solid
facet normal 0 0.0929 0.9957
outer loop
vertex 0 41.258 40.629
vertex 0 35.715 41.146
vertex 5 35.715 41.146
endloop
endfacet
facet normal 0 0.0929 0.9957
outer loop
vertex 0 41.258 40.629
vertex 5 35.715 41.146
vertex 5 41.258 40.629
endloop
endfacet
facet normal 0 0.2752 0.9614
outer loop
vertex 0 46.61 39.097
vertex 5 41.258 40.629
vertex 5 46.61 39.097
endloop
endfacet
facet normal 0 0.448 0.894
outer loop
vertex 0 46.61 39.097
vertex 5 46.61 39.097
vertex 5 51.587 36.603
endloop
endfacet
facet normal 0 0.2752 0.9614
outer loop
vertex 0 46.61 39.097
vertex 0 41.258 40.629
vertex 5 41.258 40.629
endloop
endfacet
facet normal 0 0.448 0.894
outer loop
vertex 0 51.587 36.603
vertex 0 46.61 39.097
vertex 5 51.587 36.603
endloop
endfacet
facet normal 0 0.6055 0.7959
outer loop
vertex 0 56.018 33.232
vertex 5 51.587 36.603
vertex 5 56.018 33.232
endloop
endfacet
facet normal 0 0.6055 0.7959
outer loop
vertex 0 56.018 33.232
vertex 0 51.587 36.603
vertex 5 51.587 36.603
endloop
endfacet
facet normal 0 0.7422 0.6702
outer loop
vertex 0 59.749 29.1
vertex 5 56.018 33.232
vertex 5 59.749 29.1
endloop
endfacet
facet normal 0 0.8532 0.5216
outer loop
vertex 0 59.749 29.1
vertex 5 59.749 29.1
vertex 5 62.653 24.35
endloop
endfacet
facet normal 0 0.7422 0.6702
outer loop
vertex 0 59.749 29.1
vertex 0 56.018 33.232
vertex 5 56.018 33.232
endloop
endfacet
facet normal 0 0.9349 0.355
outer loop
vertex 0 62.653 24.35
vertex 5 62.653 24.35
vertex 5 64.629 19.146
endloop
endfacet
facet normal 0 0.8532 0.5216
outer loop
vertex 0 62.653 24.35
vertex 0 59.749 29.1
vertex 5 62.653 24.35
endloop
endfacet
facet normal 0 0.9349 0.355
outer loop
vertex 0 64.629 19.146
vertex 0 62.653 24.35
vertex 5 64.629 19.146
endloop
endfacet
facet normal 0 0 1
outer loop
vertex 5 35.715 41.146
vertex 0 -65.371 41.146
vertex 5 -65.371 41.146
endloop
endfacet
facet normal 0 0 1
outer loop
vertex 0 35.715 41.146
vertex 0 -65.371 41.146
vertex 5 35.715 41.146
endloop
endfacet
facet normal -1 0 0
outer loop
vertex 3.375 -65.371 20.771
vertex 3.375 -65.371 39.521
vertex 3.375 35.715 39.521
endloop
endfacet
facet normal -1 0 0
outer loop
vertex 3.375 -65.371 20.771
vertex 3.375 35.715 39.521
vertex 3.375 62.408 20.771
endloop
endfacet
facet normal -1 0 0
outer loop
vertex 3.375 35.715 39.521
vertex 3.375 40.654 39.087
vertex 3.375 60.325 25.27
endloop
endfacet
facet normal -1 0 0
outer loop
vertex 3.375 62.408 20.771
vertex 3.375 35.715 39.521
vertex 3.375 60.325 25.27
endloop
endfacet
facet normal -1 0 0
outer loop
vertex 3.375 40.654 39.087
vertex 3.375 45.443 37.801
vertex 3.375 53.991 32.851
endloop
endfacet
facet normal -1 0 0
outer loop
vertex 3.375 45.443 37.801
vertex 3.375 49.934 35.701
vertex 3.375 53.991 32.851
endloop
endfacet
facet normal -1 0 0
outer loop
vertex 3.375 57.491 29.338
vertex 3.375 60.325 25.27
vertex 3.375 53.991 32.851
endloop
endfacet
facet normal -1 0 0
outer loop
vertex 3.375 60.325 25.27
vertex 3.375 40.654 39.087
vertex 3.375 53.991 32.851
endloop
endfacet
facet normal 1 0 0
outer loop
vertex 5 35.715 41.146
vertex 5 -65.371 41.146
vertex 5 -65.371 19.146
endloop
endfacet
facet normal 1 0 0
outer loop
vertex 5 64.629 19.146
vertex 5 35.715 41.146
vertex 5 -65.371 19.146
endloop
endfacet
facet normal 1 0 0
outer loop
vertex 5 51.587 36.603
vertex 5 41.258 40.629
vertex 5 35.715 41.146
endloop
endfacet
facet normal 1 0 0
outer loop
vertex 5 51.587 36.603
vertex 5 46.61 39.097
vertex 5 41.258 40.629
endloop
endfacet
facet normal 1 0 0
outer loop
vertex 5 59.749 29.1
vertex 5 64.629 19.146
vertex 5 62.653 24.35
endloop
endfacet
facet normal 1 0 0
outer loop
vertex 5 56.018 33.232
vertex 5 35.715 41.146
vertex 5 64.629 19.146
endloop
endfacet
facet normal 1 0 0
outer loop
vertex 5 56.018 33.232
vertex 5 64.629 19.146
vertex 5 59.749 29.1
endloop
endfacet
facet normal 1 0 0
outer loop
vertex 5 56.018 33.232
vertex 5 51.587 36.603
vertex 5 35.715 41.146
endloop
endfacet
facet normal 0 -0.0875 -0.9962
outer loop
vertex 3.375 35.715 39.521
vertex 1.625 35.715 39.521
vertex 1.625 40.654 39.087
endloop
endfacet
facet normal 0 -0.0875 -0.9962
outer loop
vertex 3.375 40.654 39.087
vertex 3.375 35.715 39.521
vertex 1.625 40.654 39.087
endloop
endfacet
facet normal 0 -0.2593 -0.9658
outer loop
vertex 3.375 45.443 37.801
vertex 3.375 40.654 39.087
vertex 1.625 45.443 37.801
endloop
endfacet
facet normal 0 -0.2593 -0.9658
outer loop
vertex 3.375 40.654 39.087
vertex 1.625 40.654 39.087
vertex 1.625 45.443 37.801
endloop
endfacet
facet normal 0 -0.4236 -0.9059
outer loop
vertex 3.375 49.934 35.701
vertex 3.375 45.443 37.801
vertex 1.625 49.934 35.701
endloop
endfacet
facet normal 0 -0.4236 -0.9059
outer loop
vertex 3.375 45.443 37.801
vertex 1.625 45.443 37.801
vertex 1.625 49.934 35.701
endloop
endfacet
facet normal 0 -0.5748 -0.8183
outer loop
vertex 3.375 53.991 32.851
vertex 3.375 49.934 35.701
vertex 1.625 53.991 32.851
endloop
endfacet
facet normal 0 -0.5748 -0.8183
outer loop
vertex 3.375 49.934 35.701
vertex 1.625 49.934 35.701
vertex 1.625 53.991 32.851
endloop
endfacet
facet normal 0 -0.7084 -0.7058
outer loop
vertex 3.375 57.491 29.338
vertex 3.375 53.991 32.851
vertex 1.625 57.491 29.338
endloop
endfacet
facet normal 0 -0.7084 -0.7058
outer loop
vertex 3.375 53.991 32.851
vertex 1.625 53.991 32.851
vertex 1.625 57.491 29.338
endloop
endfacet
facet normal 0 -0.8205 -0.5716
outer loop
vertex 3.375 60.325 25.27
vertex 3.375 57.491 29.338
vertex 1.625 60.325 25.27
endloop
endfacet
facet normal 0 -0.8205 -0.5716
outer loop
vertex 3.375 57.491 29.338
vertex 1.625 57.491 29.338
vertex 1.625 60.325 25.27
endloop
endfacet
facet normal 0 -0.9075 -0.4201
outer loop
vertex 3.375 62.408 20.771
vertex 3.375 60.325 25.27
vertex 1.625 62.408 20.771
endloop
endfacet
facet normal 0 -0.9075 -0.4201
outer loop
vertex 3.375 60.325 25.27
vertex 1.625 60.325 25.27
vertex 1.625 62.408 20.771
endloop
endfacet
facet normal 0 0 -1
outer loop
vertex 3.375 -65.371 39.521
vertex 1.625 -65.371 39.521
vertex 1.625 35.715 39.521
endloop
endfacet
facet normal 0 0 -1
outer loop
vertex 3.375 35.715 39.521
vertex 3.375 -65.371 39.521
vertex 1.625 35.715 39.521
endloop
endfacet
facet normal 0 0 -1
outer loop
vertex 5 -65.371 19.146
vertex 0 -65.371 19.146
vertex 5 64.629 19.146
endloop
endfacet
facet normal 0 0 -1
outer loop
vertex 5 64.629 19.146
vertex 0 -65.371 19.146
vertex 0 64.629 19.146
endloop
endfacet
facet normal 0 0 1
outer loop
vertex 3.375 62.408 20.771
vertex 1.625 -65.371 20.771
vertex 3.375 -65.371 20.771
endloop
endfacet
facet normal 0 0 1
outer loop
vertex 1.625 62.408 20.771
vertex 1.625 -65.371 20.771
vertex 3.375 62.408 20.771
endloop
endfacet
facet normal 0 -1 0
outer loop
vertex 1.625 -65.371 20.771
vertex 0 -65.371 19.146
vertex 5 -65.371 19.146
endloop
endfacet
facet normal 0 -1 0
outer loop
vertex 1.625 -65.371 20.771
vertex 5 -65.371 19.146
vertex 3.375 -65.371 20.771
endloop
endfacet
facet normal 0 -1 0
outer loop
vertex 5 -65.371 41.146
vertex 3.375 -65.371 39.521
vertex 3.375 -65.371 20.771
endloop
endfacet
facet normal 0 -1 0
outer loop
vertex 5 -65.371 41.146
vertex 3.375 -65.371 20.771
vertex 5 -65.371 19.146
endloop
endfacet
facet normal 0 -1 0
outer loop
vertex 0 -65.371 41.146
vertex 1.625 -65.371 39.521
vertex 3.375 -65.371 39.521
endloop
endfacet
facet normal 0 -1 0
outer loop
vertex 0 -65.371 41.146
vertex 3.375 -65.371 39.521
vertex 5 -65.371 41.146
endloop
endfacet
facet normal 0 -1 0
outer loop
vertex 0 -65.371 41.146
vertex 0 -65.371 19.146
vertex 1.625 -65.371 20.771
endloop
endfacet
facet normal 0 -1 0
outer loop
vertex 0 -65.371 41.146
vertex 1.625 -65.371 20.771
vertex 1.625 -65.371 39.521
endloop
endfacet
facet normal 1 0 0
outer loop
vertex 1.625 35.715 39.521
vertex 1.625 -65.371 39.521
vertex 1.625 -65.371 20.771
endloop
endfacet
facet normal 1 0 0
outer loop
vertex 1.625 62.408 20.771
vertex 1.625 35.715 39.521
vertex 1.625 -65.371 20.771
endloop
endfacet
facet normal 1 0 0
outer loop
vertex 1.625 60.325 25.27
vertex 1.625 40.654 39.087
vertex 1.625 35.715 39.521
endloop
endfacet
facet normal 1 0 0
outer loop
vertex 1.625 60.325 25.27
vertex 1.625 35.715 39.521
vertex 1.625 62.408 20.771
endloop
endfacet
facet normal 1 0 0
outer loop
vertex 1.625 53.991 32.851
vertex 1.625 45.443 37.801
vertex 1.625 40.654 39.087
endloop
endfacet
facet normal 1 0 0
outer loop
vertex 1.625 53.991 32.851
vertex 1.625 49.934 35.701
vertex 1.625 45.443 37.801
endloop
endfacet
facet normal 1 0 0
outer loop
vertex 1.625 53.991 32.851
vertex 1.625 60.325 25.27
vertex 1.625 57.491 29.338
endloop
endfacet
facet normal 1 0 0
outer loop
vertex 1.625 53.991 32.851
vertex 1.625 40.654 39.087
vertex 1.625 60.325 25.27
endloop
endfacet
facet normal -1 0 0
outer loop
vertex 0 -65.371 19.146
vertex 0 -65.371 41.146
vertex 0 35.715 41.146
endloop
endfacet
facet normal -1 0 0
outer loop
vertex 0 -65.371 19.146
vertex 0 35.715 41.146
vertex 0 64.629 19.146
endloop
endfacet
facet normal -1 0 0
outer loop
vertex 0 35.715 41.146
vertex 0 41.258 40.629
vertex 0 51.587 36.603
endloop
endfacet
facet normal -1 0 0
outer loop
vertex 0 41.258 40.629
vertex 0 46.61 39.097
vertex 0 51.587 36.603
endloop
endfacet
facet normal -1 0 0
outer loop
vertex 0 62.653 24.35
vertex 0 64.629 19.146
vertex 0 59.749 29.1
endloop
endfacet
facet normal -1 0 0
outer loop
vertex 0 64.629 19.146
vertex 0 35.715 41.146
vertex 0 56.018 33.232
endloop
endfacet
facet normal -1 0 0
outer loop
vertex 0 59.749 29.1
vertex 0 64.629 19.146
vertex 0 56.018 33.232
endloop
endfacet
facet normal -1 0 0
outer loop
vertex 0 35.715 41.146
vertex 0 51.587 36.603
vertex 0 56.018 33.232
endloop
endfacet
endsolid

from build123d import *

# Parameters (mm, degrees)
F0_W        = 130
F0_H        = 22
F1_DEPTH    = 5
F2_T1_DEPTH = 149.568322948
F3_T        = -1.625


# Not quite as in the source:
# - a fillet or chamfer that OpenCascade refuses, or shapes differently, is made with other operations: its cross-section is extruded or revolved along the edge and cut away or added


with BuildPart() as f1:
    # F0 (on Right) → F1 (new body)
    with BuildSketch(Plane.YZ):
        with Locations((-0.3712646805, 30.1455706358)):
            Rectangle(F0_W, F0_H)
    extrude(amount=F1_DEPTH)

    # F2: fillet of radius 30 on 1 edges, made by hand

    # F2_s2 → F2_t1 (cut)
    with BuildSketch(Plane.YZ.offset(-72.284161474)):
        with BuildLine():
            ThreePointArc((35.7150707299, 41.1455706358), (53.8809728545, 35.0202434084), (64.6287353195, 19.1455706358))
            Line((64.6287353195, 19.1455706358), (64.6287353195, 41.1455706358))
            Line((64.6287353195, 41.1455706358), (35.7150707299, 41.1455706358))
        make_face()
    extrude(amount=F2_T1_DEPTH, mode=Mode.SUBTRACT)

    # F3
    f3_openings = [f1.faces().sort_by_distance(p)[0] for p in [
        (2.5, -65.371265, 30.145571),
    ]]
    offset(amount=F3_T, openings=f3_openings)


solid = f1.part
